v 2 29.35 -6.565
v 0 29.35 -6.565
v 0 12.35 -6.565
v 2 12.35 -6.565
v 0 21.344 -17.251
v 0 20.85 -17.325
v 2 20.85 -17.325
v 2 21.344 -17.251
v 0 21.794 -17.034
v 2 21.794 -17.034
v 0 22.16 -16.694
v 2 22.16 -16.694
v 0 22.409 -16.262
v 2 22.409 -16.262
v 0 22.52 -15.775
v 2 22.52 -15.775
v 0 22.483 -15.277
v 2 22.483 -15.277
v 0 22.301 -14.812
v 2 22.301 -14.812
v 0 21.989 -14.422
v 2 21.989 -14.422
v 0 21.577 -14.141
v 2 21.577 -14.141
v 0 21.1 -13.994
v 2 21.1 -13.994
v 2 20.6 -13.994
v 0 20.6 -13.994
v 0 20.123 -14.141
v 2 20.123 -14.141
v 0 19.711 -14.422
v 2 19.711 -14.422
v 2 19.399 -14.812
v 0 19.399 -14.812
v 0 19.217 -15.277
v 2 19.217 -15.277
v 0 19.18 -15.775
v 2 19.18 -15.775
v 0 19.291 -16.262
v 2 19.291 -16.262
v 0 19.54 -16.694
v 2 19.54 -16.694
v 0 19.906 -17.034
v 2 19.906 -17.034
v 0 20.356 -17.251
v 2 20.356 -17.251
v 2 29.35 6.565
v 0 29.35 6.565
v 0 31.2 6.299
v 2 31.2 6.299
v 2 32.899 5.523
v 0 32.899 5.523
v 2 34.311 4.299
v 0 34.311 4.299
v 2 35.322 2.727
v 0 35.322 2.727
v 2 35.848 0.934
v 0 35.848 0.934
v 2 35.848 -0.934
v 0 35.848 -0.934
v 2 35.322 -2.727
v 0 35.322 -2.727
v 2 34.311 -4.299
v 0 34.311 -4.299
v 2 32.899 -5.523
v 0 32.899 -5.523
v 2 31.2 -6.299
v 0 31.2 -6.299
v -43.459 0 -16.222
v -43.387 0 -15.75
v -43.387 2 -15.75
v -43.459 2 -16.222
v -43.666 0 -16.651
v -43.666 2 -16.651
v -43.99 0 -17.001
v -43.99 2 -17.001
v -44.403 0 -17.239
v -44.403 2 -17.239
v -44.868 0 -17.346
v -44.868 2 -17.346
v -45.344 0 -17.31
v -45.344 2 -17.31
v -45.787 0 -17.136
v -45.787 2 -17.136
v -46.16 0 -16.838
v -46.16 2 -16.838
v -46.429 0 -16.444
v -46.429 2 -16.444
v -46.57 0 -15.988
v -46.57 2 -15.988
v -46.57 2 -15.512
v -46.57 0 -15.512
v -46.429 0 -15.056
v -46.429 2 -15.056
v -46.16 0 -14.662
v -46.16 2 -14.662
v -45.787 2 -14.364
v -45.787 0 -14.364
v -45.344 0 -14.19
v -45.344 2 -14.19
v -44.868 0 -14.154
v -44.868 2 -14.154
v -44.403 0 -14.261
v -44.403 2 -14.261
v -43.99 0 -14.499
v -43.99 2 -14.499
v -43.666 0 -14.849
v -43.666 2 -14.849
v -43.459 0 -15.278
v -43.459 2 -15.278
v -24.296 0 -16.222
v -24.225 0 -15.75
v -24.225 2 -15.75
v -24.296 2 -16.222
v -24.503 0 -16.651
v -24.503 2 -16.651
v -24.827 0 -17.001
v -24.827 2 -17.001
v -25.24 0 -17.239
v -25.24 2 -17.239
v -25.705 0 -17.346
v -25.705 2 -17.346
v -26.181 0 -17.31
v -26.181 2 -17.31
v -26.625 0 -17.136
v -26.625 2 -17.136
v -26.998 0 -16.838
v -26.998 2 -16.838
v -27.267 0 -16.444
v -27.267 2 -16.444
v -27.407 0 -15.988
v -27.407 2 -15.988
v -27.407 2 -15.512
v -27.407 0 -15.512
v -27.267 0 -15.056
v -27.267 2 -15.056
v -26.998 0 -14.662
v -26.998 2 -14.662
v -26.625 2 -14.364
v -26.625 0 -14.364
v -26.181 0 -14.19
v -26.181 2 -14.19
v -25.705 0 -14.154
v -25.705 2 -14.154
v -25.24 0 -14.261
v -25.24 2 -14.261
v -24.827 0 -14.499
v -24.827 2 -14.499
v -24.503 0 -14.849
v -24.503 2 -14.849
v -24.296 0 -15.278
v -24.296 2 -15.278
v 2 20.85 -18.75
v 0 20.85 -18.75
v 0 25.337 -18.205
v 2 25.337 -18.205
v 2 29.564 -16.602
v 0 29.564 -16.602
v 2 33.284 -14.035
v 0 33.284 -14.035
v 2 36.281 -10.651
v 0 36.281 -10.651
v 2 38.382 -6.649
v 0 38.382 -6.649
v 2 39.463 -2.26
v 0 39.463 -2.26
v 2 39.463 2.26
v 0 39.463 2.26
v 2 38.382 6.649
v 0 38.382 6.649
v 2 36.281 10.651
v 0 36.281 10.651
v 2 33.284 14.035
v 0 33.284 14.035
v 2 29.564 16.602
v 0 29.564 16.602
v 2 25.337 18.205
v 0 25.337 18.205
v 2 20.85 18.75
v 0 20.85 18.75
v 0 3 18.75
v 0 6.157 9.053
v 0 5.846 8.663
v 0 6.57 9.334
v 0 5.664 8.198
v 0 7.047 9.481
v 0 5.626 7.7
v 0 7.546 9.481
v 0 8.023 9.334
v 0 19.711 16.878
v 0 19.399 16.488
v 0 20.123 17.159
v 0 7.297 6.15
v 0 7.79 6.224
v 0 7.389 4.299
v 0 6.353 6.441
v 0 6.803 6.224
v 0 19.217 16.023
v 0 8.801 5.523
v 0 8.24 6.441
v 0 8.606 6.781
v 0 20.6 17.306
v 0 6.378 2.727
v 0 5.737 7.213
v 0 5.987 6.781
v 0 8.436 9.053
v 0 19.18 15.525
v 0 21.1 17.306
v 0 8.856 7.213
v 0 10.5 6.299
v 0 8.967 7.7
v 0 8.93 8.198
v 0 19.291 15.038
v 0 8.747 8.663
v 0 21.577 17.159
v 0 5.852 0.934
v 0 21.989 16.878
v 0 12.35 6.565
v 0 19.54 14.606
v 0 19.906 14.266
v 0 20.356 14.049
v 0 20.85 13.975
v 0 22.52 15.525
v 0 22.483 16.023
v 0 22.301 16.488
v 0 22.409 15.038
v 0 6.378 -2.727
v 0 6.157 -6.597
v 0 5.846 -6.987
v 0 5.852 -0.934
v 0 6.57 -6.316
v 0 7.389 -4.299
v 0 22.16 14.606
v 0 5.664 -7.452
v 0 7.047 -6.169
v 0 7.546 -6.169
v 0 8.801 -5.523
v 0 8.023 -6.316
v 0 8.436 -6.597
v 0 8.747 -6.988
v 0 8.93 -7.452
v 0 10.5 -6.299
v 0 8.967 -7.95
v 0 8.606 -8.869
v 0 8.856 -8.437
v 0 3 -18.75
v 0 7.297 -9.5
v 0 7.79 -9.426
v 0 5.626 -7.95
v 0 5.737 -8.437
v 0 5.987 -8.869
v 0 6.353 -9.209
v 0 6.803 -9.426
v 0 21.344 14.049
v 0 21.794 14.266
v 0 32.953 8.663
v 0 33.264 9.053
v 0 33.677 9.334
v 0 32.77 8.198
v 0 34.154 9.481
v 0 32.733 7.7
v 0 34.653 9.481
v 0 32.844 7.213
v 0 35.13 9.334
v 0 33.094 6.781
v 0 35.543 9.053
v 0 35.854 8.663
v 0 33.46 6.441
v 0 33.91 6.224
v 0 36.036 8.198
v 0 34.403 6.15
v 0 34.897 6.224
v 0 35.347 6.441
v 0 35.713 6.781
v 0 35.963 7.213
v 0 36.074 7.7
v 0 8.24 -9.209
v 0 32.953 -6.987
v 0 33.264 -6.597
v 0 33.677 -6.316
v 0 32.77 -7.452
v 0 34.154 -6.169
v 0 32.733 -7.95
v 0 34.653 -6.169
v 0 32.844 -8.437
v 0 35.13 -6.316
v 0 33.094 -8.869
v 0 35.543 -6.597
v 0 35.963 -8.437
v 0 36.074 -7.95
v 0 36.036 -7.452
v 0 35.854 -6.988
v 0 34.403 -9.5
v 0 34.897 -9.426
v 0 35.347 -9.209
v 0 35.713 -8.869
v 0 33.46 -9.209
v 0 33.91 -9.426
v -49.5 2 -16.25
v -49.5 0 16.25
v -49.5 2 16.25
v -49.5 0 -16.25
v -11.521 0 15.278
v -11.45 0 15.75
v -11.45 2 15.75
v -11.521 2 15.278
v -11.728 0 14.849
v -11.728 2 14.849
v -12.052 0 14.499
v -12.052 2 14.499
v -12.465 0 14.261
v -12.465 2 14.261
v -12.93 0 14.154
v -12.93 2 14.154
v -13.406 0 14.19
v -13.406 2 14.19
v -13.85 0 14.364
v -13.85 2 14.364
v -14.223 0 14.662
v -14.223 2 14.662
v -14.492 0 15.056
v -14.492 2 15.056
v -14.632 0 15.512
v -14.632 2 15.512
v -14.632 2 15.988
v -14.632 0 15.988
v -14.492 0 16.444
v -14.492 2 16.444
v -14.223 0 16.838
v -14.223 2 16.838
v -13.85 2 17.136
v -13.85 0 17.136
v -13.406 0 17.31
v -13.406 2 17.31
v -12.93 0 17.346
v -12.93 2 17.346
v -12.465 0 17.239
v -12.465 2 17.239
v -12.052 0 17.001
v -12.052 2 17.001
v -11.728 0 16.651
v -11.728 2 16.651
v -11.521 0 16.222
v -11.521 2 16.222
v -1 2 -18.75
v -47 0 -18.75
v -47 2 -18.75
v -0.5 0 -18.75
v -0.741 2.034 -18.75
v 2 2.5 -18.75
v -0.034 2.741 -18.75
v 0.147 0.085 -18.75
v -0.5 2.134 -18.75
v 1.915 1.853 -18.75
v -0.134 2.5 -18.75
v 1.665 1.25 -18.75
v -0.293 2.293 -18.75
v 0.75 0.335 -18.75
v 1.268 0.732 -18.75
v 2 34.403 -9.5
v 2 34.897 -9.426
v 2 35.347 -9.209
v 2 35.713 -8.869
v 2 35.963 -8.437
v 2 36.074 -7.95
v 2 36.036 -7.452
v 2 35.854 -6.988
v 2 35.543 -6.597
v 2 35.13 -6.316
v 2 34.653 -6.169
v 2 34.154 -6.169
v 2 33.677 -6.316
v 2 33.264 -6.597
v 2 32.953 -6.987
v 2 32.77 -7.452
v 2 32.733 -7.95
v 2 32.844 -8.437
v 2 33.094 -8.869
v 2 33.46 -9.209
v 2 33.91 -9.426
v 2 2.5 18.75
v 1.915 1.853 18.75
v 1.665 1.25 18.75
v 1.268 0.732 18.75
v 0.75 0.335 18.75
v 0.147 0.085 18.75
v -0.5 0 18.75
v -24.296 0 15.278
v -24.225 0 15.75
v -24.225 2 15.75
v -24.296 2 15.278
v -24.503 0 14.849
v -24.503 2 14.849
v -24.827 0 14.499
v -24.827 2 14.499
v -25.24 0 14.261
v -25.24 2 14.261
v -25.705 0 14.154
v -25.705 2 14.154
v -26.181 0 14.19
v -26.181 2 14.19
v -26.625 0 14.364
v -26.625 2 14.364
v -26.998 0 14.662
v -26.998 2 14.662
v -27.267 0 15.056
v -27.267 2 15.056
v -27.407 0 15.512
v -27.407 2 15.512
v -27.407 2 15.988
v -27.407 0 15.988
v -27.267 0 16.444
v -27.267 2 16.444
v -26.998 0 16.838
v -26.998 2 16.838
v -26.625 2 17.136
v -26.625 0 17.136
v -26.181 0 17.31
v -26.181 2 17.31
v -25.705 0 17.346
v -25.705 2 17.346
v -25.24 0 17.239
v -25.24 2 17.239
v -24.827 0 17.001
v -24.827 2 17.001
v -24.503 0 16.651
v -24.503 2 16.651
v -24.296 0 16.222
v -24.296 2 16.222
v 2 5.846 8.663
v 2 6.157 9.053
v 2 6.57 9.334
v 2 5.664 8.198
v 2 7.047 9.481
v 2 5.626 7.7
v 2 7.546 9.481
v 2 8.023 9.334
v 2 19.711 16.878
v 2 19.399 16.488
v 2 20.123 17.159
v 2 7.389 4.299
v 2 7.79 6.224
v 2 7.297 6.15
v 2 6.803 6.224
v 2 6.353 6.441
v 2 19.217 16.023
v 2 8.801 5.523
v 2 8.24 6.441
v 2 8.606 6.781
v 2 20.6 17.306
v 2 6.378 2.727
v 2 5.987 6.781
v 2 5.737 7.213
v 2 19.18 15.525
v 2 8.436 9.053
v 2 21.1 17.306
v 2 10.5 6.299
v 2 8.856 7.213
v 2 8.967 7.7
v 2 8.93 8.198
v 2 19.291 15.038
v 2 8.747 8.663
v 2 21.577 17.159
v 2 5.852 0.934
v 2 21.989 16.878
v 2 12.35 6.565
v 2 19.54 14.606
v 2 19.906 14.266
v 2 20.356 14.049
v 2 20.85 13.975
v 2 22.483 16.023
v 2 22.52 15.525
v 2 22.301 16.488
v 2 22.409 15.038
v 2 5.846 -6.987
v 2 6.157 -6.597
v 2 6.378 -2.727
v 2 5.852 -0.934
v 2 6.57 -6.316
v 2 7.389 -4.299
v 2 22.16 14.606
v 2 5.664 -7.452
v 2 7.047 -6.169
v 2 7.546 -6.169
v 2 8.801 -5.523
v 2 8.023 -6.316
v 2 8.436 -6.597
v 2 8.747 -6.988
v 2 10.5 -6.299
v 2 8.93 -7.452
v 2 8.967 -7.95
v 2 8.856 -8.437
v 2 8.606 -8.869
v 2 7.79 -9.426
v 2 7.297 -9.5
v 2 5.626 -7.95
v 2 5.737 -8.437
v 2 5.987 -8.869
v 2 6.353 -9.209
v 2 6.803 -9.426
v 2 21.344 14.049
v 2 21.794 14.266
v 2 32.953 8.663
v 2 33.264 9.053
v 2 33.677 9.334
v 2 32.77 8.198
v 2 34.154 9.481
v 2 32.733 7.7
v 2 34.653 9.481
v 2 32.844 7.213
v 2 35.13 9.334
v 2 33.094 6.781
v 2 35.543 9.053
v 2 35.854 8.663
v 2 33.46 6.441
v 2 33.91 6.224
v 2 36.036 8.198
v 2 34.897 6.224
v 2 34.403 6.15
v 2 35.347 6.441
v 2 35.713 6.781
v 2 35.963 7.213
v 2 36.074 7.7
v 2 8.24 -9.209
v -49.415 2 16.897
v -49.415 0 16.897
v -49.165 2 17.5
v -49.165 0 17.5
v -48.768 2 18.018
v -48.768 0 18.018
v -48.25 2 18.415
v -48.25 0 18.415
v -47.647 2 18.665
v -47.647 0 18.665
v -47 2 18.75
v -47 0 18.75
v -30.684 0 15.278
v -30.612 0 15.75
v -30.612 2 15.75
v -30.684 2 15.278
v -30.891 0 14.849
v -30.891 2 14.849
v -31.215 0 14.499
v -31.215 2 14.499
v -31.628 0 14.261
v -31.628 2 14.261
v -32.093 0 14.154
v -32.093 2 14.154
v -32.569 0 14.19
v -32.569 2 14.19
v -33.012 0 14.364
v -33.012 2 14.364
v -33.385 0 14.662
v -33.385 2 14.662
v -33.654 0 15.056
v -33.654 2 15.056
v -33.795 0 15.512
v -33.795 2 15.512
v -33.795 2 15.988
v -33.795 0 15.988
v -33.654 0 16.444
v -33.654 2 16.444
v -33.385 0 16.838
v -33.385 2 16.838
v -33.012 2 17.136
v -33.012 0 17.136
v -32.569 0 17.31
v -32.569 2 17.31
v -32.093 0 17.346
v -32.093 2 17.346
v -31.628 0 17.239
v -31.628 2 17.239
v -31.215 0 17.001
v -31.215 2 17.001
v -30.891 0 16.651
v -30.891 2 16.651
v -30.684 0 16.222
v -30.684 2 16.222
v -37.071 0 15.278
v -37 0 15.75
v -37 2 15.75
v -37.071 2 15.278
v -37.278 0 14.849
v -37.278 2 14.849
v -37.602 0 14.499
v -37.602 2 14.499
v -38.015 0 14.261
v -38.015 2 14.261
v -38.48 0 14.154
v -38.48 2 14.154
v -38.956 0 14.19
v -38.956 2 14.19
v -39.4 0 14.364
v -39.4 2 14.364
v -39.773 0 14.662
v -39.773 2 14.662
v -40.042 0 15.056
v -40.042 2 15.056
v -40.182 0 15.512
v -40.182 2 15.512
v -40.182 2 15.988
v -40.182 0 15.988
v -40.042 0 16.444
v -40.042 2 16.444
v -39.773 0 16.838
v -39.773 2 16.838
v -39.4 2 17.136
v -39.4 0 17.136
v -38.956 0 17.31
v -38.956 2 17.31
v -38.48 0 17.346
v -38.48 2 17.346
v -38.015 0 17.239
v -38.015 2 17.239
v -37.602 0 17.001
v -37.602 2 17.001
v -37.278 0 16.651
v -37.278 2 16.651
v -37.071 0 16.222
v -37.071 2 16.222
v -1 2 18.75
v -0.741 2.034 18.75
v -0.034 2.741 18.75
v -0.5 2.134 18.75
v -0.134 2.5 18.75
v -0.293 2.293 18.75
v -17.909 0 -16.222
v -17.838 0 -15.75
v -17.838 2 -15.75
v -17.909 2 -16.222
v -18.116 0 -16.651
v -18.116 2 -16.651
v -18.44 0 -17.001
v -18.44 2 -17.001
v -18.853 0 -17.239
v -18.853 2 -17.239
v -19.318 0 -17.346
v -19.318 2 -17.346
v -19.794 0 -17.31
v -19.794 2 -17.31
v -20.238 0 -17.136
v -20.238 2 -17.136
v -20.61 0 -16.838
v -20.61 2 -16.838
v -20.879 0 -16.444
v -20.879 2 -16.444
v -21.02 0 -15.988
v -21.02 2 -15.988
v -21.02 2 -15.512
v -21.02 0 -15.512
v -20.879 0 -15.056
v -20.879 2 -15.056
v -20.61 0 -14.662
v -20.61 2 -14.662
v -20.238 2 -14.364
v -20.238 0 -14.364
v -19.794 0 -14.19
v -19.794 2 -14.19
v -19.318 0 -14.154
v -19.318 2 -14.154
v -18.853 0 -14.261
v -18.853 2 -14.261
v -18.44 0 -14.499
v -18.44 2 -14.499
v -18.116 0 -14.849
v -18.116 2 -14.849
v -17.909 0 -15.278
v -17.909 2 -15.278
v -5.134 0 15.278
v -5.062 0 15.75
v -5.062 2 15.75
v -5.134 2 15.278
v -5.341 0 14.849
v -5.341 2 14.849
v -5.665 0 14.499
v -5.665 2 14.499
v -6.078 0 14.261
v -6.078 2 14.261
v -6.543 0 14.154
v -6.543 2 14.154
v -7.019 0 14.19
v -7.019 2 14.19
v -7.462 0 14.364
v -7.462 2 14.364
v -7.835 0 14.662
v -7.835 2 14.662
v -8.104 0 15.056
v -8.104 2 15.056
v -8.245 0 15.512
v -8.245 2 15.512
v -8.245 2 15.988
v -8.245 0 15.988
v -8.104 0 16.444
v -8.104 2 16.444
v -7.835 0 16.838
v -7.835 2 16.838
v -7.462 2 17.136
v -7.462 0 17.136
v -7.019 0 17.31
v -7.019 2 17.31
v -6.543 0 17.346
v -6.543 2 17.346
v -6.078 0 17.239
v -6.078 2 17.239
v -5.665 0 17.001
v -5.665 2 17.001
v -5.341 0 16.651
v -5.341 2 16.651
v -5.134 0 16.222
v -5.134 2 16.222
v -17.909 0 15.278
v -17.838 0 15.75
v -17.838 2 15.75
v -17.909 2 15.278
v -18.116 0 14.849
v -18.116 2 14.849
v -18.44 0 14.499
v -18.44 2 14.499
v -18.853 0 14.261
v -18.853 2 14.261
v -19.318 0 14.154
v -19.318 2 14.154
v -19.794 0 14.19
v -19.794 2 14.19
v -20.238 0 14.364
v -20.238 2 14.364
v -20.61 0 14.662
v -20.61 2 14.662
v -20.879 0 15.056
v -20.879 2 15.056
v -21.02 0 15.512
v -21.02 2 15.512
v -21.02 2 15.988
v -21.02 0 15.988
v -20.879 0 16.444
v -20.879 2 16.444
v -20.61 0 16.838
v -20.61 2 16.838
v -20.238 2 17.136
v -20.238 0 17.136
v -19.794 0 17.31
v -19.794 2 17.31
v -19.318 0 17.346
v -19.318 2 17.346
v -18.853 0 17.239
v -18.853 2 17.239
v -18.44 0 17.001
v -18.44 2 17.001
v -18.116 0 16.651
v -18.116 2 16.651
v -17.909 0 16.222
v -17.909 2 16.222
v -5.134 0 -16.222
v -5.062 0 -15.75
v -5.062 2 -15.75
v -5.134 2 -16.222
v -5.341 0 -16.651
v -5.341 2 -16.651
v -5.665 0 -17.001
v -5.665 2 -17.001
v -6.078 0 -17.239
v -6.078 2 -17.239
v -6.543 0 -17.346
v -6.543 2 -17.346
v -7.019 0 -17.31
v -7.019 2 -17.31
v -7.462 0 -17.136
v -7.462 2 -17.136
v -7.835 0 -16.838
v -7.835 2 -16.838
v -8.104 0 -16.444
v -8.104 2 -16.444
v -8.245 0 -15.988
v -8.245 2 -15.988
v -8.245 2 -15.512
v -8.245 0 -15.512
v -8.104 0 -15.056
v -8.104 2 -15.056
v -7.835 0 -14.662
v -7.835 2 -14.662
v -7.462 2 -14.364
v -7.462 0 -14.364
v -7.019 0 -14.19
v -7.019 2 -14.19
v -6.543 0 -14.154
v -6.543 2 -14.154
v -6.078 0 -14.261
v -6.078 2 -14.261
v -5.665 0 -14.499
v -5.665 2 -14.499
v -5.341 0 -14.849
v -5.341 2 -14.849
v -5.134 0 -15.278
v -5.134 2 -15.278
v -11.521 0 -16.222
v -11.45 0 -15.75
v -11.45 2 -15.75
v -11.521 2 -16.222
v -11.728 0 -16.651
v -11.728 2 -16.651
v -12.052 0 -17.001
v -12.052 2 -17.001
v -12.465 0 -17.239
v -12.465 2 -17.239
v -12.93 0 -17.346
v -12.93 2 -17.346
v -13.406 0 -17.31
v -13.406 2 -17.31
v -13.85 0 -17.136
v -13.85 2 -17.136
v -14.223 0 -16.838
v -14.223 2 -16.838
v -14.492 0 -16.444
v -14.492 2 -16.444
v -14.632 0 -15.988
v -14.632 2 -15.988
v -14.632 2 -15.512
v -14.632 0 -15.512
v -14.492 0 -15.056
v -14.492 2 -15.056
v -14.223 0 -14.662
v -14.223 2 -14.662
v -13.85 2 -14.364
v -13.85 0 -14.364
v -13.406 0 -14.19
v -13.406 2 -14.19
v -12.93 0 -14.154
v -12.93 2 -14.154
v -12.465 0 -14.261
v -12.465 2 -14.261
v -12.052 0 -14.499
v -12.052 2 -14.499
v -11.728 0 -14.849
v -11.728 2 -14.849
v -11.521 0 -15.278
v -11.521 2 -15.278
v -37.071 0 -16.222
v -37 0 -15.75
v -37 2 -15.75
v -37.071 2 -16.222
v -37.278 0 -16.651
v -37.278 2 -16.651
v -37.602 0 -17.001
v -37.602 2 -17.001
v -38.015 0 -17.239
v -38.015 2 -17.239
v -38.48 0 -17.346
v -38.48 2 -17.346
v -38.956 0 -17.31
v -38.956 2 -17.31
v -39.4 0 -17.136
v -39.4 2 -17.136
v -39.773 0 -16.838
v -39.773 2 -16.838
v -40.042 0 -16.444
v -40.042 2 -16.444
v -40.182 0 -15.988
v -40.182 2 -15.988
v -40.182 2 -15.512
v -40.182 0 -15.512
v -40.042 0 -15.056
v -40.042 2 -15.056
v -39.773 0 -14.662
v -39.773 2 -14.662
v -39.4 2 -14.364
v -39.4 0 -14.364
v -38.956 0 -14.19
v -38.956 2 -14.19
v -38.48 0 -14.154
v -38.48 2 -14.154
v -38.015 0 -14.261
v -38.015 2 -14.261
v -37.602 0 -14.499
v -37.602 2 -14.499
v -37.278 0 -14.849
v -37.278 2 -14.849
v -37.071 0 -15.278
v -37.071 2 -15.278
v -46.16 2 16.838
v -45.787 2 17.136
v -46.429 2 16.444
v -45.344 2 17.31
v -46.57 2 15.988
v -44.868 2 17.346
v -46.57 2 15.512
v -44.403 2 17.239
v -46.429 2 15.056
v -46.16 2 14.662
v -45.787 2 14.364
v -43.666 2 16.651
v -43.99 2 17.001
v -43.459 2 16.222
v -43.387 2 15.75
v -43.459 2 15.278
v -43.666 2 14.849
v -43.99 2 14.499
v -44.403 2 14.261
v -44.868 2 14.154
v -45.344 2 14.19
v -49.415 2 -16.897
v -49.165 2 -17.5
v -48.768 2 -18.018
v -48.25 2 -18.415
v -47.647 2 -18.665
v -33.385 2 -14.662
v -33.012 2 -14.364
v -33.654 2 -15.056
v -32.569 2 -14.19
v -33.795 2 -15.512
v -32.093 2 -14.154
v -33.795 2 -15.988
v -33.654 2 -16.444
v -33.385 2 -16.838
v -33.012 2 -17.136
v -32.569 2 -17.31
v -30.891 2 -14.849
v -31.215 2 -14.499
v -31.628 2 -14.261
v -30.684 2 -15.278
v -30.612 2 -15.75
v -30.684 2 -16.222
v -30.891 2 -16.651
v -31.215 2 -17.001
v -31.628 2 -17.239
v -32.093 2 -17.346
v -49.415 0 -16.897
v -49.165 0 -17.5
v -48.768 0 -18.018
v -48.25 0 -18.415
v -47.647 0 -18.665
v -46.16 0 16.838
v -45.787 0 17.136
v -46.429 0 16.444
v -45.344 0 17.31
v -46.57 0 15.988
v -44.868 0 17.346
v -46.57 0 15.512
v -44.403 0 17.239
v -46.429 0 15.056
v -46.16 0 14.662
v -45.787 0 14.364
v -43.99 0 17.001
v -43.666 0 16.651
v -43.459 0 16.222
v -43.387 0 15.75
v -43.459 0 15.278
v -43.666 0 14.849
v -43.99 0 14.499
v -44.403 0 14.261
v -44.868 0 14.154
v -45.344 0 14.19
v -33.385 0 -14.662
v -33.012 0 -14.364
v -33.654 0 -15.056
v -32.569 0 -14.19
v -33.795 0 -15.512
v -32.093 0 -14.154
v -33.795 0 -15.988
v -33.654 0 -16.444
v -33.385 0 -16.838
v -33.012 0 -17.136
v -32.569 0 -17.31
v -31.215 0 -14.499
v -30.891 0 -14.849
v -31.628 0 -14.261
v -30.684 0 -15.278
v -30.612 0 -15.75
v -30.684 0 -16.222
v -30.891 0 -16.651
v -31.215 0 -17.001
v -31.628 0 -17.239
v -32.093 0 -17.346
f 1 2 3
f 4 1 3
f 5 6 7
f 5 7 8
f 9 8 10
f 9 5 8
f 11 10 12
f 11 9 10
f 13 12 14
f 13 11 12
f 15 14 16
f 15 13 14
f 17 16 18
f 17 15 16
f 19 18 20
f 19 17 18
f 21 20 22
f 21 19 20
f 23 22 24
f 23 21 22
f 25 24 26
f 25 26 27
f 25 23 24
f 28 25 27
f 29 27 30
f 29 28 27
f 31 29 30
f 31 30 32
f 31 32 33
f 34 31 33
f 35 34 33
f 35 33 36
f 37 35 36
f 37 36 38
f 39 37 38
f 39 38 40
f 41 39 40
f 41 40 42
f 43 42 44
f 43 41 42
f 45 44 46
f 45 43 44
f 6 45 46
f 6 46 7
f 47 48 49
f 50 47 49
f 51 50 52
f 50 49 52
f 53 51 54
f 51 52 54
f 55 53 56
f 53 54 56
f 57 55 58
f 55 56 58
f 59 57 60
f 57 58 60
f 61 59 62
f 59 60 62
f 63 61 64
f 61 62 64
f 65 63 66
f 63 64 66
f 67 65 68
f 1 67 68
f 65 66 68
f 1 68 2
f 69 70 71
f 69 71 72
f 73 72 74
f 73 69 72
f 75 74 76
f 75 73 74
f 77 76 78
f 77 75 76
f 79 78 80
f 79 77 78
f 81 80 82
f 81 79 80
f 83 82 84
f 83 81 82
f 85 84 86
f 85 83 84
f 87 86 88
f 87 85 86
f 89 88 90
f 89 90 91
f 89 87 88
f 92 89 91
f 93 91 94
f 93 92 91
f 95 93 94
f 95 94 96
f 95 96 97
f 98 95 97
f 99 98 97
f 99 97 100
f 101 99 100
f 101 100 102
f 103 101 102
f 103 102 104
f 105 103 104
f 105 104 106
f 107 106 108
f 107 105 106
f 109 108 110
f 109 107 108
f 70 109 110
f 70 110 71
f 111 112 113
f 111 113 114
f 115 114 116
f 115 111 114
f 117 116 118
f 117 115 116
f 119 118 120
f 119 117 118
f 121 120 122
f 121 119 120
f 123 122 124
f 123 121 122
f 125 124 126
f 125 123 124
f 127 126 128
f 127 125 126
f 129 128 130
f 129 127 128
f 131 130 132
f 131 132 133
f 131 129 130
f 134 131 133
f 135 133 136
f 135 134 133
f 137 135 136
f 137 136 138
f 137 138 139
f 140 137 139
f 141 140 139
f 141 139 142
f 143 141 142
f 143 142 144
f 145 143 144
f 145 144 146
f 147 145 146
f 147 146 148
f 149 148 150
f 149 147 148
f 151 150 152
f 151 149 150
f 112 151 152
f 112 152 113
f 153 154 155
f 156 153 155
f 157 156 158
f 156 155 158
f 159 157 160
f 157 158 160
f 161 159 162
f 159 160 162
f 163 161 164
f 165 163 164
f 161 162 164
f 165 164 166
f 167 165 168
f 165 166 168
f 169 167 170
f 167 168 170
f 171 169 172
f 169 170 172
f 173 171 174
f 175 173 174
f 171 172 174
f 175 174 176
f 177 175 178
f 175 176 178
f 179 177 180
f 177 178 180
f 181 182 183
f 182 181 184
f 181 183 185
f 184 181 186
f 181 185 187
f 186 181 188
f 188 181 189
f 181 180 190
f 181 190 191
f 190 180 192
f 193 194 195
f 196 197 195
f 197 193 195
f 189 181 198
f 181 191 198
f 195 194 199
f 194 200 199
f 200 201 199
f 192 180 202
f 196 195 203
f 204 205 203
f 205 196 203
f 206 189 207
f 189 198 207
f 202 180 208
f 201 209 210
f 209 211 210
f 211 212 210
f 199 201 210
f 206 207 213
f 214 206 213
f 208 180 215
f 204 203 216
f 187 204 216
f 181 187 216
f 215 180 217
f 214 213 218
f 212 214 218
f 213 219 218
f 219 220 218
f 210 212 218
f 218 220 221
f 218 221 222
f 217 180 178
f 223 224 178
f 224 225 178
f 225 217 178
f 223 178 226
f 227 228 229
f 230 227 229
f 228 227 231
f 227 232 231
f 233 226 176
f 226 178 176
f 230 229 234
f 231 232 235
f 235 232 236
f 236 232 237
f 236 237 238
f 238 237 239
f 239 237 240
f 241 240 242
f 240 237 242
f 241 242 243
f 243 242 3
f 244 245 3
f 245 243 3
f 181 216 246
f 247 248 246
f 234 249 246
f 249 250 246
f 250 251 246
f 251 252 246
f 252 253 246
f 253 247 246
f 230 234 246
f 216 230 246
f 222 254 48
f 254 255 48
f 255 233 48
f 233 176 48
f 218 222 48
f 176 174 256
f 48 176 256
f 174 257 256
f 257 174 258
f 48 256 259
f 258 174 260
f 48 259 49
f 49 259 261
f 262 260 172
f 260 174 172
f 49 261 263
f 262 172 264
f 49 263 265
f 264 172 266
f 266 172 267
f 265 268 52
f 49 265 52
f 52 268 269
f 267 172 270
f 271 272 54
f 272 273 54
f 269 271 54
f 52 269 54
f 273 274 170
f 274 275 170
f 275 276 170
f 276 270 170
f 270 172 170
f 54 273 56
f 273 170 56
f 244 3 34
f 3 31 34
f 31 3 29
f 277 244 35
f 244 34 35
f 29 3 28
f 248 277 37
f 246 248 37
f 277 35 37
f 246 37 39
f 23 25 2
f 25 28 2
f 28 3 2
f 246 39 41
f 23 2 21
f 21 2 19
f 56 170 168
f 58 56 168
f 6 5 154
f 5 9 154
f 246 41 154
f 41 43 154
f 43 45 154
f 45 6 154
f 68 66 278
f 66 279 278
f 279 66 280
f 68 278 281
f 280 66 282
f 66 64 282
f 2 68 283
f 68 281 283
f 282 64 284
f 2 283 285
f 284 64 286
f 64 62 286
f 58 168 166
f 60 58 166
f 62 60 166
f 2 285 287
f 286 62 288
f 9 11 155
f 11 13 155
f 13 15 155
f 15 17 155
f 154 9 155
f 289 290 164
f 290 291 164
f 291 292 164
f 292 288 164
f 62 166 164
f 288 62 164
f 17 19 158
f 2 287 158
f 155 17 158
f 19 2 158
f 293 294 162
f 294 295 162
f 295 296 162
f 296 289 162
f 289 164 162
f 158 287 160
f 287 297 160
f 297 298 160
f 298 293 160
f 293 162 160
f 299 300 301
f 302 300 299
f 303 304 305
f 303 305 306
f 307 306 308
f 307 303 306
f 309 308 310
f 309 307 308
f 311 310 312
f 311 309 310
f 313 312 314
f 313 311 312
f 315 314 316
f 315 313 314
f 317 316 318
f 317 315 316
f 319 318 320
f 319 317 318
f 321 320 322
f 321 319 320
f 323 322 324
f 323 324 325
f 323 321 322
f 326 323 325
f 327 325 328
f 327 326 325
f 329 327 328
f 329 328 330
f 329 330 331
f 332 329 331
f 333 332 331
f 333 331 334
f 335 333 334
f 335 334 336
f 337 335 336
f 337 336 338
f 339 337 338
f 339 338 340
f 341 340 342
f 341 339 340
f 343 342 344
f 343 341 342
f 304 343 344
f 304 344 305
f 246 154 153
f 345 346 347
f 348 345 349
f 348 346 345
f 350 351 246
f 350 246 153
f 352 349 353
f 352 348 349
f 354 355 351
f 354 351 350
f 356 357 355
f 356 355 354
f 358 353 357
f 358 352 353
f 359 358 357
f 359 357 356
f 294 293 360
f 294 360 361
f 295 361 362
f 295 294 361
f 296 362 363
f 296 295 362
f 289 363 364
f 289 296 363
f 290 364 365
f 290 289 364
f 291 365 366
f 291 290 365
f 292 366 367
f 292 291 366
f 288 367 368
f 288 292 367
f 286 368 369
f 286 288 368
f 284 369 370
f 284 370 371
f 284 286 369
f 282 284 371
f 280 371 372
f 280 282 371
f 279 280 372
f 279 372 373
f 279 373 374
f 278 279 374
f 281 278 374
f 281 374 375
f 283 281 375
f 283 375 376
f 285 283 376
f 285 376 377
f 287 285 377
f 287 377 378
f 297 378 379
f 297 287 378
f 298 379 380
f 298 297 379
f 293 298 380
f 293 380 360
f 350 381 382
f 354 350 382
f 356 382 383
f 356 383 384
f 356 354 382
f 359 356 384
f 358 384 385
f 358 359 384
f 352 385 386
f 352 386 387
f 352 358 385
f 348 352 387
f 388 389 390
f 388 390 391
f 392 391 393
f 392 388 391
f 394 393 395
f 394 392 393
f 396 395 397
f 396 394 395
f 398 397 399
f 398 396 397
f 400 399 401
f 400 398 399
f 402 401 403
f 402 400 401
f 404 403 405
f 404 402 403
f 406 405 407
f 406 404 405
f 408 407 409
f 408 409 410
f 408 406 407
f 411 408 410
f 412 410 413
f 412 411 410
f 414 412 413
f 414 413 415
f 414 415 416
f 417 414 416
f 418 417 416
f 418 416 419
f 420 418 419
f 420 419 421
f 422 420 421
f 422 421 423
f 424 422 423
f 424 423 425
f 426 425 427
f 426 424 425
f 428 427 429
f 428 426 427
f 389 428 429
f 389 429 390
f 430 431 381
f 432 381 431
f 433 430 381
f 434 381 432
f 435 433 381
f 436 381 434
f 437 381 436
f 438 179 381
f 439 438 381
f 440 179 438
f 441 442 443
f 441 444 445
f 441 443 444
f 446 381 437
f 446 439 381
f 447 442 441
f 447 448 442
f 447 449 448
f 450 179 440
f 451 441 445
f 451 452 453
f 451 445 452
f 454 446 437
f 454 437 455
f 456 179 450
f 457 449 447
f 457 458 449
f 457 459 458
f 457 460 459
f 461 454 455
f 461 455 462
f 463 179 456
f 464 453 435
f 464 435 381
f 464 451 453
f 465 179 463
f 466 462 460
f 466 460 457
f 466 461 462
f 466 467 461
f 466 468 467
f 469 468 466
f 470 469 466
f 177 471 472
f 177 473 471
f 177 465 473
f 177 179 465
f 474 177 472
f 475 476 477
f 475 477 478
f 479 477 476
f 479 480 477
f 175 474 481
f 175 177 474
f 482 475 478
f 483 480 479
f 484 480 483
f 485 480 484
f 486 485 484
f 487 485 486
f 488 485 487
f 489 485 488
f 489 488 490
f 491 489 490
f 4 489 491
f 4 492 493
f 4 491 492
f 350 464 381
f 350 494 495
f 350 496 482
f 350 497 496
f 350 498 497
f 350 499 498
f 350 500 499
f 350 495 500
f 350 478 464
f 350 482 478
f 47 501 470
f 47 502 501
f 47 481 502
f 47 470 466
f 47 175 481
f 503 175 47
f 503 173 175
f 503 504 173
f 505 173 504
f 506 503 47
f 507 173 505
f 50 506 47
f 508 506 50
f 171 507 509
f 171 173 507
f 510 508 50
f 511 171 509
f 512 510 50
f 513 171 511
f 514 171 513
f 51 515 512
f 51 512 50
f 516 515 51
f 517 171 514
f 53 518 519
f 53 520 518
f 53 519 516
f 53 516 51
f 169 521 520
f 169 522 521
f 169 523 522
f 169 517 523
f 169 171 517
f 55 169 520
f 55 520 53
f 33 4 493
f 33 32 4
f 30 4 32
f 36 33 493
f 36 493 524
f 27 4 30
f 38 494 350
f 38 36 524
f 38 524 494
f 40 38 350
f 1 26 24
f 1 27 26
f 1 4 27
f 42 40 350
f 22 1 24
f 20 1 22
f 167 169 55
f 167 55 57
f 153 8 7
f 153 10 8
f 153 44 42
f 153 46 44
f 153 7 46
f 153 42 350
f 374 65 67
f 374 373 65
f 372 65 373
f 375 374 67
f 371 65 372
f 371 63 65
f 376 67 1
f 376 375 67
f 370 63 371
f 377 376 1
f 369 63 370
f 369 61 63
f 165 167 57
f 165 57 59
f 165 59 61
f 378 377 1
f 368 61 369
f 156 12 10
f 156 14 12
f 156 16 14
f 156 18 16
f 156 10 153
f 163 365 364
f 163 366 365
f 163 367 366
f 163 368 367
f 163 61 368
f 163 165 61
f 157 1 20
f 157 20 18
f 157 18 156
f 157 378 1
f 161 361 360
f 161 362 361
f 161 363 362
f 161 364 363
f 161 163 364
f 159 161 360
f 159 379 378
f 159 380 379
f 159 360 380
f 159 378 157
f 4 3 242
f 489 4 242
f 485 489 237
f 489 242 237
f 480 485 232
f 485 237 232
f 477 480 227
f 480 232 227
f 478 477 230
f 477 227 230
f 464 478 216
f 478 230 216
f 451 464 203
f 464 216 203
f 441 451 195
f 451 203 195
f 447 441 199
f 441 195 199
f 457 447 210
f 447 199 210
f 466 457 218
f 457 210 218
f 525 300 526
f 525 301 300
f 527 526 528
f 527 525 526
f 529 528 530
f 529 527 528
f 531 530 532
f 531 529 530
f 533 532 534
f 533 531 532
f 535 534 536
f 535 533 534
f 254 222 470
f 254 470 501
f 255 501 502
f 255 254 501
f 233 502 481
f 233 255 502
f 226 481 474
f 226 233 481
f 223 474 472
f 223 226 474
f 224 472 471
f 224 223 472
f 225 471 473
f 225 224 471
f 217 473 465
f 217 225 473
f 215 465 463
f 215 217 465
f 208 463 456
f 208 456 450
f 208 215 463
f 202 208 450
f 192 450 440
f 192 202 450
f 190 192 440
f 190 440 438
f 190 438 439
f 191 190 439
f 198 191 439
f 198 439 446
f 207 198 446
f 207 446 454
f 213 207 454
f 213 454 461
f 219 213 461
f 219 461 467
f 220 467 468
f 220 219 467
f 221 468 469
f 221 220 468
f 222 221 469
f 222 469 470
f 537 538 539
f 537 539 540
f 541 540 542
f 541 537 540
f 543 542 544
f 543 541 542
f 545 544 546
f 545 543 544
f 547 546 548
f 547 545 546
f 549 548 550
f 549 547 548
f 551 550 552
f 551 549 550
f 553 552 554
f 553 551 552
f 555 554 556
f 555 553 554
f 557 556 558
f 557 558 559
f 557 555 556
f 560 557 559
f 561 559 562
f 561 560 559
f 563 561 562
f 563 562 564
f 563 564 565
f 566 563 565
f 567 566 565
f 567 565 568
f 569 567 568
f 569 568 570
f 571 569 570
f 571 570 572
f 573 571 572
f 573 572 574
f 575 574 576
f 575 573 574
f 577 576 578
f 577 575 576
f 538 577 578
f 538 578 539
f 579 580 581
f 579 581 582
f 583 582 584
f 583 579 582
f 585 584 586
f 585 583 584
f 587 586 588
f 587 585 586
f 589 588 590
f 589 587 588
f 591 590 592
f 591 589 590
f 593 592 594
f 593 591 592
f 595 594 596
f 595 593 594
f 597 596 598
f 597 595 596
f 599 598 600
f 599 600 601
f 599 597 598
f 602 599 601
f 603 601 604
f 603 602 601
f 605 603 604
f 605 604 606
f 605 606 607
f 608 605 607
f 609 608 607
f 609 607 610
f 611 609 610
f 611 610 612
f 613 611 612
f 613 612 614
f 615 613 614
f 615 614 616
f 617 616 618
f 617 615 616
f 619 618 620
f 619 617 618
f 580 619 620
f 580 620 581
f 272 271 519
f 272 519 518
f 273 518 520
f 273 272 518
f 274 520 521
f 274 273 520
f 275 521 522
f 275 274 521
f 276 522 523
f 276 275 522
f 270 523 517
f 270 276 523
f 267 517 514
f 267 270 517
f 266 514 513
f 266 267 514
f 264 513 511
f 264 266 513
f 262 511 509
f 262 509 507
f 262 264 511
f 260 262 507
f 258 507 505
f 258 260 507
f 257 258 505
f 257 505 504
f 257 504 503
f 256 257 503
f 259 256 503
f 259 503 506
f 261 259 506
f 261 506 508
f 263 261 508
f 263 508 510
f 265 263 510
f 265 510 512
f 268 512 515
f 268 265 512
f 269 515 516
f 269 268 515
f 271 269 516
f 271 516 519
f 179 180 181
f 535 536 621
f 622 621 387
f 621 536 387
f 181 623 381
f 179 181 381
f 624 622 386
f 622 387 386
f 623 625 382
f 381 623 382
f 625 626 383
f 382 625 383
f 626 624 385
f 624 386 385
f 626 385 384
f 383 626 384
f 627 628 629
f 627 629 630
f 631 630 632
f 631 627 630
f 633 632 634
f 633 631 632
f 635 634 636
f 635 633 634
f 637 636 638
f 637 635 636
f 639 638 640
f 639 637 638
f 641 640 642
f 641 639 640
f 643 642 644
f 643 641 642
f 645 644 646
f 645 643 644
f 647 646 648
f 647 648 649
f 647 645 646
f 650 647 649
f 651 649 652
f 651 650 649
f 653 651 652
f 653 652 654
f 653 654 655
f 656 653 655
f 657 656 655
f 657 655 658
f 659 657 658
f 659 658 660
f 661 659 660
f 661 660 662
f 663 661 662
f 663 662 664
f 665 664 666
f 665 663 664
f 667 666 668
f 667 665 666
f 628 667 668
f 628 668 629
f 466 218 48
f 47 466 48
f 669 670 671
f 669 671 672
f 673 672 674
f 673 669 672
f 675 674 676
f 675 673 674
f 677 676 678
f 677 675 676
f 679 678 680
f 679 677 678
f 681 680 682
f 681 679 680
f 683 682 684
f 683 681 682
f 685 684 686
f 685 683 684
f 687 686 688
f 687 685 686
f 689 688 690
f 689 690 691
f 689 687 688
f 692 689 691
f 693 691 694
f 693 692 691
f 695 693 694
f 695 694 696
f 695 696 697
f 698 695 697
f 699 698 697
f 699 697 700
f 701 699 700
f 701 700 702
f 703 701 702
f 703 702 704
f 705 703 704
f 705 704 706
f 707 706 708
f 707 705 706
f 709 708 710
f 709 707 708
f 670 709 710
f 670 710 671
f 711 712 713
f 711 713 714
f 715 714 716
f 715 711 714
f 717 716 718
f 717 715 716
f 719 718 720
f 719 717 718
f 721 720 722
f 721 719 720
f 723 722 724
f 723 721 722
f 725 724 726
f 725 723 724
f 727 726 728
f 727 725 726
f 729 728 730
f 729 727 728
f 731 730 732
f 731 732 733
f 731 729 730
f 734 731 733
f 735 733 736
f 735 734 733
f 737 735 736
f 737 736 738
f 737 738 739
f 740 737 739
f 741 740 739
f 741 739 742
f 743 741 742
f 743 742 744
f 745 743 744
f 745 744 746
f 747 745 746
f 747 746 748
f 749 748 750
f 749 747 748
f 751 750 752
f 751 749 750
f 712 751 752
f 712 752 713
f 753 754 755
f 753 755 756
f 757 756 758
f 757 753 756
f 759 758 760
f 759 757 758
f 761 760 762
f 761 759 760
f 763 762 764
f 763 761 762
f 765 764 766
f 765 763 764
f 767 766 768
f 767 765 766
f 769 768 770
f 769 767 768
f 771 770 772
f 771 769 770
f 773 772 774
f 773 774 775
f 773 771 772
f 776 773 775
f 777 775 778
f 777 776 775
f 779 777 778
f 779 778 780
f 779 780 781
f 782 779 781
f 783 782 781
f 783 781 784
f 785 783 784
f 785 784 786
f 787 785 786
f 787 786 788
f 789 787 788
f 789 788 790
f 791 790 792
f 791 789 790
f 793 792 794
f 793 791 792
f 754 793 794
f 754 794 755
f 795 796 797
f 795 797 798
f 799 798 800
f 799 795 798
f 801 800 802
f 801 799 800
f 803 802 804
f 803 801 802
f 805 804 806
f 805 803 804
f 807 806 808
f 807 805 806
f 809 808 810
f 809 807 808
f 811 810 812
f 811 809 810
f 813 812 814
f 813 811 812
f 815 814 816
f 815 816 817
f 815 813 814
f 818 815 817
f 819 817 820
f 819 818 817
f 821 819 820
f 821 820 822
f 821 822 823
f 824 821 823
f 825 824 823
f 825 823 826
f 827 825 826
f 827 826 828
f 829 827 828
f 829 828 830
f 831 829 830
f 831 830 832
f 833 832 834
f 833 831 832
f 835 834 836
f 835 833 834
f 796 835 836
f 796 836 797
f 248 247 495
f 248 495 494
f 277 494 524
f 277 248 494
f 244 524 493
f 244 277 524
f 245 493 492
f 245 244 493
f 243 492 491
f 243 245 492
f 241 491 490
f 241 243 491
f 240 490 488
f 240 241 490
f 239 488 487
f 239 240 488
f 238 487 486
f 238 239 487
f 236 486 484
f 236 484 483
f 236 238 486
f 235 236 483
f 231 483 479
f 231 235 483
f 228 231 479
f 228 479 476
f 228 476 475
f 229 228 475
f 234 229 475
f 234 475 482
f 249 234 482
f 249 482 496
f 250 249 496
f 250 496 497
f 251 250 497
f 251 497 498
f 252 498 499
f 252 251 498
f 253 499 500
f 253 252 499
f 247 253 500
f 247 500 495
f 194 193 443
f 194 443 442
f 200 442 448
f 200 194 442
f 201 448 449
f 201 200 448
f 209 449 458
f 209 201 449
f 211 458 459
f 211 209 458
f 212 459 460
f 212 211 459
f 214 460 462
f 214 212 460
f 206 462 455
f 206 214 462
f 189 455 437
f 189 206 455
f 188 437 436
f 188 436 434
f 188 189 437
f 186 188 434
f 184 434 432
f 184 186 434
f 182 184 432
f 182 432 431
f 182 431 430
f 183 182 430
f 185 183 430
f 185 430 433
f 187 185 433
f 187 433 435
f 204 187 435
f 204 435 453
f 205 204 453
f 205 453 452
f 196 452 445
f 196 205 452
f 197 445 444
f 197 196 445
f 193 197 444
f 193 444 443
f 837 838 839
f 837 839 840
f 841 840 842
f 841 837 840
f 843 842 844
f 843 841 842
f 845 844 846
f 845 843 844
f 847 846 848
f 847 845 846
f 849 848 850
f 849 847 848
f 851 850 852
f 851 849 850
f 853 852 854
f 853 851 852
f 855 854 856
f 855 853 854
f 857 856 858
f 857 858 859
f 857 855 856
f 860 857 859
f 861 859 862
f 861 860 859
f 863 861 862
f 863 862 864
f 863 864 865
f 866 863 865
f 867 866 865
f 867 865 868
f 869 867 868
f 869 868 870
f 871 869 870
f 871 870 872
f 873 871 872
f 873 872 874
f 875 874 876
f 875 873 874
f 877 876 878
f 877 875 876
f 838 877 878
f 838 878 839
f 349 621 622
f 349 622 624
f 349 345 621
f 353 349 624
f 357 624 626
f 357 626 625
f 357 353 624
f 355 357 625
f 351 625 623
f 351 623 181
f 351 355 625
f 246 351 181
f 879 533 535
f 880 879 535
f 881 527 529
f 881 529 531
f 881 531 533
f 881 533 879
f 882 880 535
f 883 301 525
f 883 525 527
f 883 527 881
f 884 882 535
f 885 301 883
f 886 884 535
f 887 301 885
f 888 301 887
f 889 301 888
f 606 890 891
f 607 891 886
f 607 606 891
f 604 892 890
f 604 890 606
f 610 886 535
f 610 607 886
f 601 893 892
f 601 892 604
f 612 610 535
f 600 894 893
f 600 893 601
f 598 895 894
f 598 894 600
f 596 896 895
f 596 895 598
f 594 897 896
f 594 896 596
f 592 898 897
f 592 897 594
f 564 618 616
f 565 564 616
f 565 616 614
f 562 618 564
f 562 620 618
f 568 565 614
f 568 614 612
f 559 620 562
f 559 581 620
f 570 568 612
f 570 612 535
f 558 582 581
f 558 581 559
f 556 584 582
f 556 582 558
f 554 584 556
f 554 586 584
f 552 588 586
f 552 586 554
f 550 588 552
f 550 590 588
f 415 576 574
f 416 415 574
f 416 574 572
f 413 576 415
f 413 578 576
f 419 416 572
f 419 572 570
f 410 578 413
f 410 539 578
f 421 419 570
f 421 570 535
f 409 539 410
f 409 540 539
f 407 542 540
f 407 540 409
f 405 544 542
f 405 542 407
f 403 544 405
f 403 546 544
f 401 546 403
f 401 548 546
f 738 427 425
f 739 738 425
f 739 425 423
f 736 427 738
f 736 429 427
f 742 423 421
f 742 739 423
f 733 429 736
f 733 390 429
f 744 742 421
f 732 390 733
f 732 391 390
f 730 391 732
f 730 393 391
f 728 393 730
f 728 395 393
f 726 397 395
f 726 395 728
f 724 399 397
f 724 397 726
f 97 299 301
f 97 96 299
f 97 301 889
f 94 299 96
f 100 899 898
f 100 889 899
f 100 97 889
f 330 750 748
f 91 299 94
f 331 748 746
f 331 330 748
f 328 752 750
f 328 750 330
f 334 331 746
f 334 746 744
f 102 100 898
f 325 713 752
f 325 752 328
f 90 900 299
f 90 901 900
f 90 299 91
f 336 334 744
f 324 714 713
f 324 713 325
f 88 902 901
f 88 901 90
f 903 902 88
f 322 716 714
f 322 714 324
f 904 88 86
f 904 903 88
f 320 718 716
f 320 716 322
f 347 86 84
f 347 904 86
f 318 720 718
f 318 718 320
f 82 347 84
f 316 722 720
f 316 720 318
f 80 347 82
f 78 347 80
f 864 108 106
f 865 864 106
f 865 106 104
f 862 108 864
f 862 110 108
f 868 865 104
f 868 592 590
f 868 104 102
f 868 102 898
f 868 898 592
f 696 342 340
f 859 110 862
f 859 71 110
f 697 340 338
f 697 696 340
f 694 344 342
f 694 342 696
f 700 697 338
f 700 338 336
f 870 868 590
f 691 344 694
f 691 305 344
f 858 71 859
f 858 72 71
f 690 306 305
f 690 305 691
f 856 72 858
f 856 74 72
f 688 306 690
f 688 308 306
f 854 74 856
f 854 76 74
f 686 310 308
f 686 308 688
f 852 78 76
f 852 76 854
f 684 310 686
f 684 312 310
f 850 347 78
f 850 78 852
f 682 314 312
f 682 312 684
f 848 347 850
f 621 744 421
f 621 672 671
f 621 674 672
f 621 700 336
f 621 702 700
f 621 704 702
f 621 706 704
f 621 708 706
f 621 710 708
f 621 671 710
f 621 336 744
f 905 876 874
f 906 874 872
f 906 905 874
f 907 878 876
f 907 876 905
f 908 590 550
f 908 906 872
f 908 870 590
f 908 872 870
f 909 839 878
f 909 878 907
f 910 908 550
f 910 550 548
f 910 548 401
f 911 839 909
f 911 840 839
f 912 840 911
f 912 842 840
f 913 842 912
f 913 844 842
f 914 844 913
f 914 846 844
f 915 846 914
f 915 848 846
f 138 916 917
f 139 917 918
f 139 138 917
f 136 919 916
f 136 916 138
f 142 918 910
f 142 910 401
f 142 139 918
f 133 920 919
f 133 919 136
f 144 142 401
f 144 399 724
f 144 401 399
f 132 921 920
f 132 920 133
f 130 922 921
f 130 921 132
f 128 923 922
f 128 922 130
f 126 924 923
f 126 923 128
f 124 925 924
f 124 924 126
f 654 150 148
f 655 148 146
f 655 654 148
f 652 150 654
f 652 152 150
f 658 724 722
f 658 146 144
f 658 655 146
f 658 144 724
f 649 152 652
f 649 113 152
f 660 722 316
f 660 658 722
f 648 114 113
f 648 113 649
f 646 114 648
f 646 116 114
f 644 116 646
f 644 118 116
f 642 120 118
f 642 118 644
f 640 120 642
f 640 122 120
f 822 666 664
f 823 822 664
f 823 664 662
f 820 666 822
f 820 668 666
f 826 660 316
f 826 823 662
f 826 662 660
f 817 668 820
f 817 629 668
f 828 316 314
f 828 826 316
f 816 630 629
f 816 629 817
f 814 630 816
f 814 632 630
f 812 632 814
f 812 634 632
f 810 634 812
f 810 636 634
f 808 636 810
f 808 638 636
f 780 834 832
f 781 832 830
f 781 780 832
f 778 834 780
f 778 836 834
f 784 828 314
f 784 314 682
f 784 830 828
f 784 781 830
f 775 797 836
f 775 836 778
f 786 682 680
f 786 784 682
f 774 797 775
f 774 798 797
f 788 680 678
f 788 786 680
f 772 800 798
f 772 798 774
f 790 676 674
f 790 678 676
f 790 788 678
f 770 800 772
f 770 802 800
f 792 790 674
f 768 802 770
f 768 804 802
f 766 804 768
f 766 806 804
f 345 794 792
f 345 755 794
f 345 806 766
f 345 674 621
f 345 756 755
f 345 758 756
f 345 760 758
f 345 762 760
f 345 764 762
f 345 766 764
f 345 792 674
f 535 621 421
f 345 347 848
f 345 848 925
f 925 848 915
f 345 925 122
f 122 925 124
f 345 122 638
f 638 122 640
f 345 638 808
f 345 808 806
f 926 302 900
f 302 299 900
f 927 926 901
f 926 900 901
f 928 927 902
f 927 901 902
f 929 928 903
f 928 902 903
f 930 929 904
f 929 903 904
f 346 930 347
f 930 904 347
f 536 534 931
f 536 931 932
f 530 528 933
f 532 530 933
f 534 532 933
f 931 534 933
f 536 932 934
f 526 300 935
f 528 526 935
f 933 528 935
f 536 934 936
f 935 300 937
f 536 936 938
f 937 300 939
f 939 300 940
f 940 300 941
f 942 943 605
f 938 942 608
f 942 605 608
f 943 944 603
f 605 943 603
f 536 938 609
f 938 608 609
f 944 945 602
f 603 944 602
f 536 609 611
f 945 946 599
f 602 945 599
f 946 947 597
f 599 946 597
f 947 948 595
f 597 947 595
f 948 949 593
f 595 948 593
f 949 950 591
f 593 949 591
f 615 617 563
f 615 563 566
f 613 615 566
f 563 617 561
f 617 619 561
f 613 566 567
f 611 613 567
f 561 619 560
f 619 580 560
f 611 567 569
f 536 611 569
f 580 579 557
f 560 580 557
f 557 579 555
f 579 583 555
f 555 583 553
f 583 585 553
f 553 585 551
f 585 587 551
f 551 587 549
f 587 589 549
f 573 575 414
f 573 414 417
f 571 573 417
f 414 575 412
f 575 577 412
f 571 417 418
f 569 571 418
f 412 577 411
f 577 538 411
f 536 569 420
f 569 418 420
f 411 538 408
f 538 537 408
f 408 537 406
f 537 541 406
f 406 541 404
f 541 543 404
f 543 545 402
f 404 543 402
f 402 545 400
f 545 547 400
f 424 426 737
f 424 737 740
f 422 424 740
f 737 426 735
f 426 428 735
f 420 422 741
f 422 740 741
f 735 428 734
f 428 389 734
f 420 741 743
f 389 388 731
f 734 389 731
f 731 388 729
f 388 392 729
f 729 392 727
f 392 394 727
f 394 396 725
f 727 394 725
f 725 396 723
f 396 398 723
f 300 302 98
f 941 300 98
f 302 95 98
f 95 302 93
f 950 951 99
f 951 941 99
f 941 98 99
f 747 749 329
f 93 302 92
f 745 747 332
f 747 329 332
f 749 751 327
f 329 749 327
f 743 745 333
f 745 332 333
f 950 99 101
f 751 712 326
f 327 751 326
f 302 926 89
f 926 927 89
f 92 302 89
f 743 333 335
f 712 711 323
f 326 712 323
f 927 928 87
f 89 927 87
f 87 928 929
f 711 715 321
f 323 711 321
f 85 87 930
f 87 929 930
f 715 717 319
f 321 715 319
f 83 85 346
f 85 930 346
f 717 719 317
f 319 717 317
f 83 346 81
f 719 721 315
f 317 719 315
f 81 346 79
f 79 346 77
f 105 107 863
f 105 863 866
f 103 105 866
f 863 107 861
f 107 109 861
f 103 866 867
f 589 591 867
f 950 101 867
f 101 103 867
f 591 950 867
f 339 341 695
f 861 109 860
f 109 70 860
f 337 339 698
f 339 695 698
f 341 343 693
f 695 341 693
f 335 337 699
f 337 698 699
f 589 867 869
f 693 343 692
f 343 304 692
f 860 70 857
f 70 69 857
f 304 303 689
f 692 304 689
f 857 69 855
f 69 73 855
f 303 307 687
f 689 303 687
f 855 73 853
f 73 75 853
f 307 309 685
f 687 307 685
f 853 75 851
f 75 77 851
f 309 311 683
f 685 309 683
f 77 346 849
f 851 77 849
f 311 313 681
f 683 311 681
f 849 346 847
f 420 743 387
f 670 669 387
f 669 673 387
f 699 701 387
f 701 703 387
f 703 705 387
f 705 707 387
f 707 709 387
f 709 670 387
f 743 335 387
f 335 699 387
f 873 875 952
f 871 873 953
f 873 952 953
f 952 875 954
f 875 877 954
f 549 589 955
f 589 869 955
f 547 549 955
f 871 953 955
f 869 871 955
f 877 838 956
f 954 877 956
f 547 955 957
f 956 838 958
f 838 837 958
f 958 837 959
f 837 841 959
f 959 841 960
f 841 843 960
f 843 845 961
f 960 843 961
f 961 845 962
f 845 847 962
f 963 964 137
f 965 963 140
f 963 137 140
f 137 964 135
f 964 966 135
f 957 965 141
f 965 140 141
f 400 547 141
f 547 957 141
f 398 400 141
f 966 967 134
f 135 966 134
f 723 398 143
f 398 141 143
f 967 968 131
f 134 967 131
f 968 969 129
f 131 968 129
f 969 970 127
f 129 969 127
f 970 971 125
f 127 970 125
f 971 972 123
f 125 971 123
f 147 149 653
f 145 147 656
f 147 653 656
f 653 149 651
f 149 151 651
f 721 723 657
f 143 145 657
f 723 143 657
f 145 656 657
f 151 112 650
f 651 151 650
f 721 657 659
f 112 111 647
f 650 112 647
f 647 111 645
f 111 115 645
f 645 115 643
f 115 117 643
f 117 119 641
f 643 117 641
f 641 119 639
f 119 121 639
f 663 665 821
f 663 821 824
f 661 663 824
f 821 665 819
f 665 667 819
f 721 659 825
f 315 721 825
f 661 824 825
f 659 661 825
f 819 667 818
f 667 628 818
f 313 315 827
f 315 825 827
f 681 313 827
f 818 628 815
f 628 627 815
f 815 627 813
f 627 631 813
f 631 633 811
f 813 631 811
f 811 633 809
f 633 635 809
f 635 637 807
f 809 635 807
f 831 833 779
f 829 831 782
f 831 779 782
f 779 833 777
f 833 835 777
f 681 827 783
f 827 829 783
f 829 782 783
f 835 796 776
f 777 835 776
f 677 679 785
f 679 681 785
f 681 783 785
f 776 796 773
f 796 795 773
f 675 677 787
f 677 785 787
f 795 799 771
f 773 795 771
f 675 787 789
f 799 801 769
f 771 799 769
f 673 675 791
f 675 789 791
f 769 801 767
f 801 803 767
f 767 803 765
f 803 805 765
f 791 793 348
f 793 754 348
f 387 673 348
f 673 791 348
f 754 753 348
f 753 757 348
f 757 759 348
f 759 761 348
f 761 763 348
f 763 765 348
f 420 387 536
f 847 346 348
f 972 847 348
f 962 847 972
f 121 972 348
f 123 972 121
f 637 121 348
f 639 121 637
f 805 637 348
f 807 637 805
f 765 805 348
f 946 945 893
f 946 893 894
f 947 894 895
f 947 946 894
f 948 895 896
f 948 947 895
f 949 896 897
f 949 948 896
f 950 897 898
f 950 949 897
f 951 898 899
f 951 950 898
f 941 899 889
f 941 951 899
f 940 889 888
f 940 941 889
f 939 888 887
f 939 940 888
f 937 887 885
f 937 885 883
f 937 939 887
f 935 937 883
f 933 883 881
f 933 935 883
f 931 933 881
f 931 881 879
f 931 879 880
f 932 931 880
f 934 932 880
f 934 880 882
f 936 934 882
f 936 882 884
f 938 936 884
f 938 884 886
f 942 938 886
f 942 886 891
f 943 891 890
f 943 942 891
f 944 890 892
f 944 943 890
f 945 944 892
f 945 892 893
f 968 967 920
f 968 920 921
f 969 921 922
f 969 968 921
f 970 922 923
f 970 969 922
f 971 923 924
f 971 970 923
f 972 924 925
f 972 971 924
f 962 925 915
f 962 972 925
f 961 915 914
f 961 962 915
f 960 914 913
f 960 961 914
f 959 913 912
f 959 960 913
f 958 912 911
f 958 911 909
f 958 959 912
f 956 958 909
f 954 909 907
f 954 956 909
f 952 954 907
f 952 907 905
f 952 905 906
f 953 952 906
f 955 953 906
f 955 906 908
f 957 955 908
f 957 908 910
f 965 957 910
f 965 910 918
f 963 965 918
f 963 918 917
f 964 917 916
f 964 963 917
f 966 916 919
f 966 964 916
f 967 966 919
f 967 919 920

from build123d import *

# Parameters (mm, degrees)
SKETCH1_R           = 1.675
BOSS_EXTRUDE1_DEPTH = 2
SKETCH2_W           = 49.5
SKETCH2_H           = 37.5
SKETCH2_R           = 1.6
BOSS_EXTRUDE2_DEPTH = 2
FILLET1_R           = 2.5
FILLET2_R           = 1


with BuildPart() as part:
    # Sketch1 → Boss-Extrude1 (new body)
    with BuildSketch(Plane(origin=(0, 0, 0), x_dir=(0, 0, -1), z_dir=(1, 0, 0))):
        with BuildLine():
            Line((-18.75, 0), (18.75, 0))
            Line((18.75, 0), (18.75, 20.85))
            ThreePointArc((18.75, 20.85), (0, 39.6), (-18.75, 20.85))
            Line((-18.75, 20.85), (-18.75, 0))
        make_face()
        with Locations((-7.825, 7.296702431)):
            Circle(SKETCH1_R, mode=Mode.SUBTRACT)
        with Locations((7.825, 7.296702431)):
            Circle(SKETCH1_R, mode=Mode.SUBTRACT)
        with Locations((-15.65, 20.85)):
            Circle(SKETCH1_R, mode=Mode.SUBTRACT)
        with Locations((-7.825, 34.403297569)):
            Circle(SKETCH1_R, mode=Mode.SUBTRACT)
        with BuildLine():
            Line((-6.565, 12.35), (-6.565, 29.35))
            ThreePointArc((-6.565, 29.35), (0, 35.915), (6.565, 29.35))
            Line((6.565, 29.35), (6.565, 12.35))
            ThreePointArc((6.565, 12.35), (0, 5.785), (-6.565, 12.35))
        make_face(mode=Mode.SUBTRACT)
        with Locations((15.65, 20.85)):
            Circle(SKETCH1_R, mode=Mode.SUBTRACT)
        with Locations((7.825, 34.403297569)):
            Circle(SKETCH1_R, mode=Mode.SUBTRACT)
    extrude(amount=BOSS_EXTRUDE1_DEPTH)

    # Sketch2 → Boss-Extrude2 (add)
    with BuildSketch(Plane(origin=(0, 0, 0), x_dir=(1, 0, 0), z_dir=(0, 1, 0))):
        with Locations((-24.75, 0)):
            Rectangle(SKETCH2_W, SKETCH2_H)
        with Locations((-44.9875, 15.75)):
            Circle(SKETCH2_R, mode=Mode.SUBTRACT)
        with Locations((-38.6, 15.75)):
            Circle(SKETCH2_R, mode=Mode.SUBTRACT)
        with Locations((-32.2125, 15.75)):
            Circle(SKETCH2_R, mode=Mode.SUBTRACT)
        with Locations((-25.825, 15.75)):
            Circle(SKETCH2_R, mode=Mode.SUBTRACT)
        with Locations((-19.4375, 15.75)):
            Circle(SKETCH2_R, mode=Mode.SUBTRACT)
        with Locations((-13.05, 15.75)):
            Circle(SKETCH2_R, mode=Mode.SUBTRACT)
        with Locations((-6.6625, 15.75)):
            Circle(SKETCH2_R, mode=Mode.SUBTRACT)
        with Locations((-6.6625, -15.75)):
            Circle(SKETCH2_R, mode=Mode.SUBTRACT)
        with Locations((-13.05, -15.75)):
            Circle(SKETCH2_R, mode=Mode.SUBTRACT)
        with Locations((-19.4375, -15.75)):
            Circle(SKETCH2_R, mode=Mode.SUBTRACT)
        with Locations((-44.9875, -15.75)):
            Circle(SKETCH2_R, mode=Mode.SUBTRACT)
        with Locations((-38.6, -15.75)):
            Circle(SKETCH2_R, mode=Mode.SUBTRACT)
        with Locations((-32.2125, -15.75)):
            Circle(SKETCH2_R, mode=Mode.SUBTRACT)
        with Locations((-25.825, -15.75)):
            Circle(SKETCH2_R, mode=Mode.SUBTRACT)
    extrude(amount=BOSS_EXTRUDE2_DEPTH)

    # Fillet1
    fillet1_edges = [part.edges().sort_by_distance(p)[0] for p in [
        (-49.5, 1, 18.75),
        (-49.5, 1, -18.75),
        (2, 0, 0),
    ]]
    fillet(fillet1_edges, radius=FILLET1_R)

    # Fillet2
    fillet2_edges = [part.edges().sort_by_distance(p)[0] for p in [
        (0, 2, 0),
    ]]
    fillet(fillet2_edges, radius=FILLET2_R)


solid = part.part
